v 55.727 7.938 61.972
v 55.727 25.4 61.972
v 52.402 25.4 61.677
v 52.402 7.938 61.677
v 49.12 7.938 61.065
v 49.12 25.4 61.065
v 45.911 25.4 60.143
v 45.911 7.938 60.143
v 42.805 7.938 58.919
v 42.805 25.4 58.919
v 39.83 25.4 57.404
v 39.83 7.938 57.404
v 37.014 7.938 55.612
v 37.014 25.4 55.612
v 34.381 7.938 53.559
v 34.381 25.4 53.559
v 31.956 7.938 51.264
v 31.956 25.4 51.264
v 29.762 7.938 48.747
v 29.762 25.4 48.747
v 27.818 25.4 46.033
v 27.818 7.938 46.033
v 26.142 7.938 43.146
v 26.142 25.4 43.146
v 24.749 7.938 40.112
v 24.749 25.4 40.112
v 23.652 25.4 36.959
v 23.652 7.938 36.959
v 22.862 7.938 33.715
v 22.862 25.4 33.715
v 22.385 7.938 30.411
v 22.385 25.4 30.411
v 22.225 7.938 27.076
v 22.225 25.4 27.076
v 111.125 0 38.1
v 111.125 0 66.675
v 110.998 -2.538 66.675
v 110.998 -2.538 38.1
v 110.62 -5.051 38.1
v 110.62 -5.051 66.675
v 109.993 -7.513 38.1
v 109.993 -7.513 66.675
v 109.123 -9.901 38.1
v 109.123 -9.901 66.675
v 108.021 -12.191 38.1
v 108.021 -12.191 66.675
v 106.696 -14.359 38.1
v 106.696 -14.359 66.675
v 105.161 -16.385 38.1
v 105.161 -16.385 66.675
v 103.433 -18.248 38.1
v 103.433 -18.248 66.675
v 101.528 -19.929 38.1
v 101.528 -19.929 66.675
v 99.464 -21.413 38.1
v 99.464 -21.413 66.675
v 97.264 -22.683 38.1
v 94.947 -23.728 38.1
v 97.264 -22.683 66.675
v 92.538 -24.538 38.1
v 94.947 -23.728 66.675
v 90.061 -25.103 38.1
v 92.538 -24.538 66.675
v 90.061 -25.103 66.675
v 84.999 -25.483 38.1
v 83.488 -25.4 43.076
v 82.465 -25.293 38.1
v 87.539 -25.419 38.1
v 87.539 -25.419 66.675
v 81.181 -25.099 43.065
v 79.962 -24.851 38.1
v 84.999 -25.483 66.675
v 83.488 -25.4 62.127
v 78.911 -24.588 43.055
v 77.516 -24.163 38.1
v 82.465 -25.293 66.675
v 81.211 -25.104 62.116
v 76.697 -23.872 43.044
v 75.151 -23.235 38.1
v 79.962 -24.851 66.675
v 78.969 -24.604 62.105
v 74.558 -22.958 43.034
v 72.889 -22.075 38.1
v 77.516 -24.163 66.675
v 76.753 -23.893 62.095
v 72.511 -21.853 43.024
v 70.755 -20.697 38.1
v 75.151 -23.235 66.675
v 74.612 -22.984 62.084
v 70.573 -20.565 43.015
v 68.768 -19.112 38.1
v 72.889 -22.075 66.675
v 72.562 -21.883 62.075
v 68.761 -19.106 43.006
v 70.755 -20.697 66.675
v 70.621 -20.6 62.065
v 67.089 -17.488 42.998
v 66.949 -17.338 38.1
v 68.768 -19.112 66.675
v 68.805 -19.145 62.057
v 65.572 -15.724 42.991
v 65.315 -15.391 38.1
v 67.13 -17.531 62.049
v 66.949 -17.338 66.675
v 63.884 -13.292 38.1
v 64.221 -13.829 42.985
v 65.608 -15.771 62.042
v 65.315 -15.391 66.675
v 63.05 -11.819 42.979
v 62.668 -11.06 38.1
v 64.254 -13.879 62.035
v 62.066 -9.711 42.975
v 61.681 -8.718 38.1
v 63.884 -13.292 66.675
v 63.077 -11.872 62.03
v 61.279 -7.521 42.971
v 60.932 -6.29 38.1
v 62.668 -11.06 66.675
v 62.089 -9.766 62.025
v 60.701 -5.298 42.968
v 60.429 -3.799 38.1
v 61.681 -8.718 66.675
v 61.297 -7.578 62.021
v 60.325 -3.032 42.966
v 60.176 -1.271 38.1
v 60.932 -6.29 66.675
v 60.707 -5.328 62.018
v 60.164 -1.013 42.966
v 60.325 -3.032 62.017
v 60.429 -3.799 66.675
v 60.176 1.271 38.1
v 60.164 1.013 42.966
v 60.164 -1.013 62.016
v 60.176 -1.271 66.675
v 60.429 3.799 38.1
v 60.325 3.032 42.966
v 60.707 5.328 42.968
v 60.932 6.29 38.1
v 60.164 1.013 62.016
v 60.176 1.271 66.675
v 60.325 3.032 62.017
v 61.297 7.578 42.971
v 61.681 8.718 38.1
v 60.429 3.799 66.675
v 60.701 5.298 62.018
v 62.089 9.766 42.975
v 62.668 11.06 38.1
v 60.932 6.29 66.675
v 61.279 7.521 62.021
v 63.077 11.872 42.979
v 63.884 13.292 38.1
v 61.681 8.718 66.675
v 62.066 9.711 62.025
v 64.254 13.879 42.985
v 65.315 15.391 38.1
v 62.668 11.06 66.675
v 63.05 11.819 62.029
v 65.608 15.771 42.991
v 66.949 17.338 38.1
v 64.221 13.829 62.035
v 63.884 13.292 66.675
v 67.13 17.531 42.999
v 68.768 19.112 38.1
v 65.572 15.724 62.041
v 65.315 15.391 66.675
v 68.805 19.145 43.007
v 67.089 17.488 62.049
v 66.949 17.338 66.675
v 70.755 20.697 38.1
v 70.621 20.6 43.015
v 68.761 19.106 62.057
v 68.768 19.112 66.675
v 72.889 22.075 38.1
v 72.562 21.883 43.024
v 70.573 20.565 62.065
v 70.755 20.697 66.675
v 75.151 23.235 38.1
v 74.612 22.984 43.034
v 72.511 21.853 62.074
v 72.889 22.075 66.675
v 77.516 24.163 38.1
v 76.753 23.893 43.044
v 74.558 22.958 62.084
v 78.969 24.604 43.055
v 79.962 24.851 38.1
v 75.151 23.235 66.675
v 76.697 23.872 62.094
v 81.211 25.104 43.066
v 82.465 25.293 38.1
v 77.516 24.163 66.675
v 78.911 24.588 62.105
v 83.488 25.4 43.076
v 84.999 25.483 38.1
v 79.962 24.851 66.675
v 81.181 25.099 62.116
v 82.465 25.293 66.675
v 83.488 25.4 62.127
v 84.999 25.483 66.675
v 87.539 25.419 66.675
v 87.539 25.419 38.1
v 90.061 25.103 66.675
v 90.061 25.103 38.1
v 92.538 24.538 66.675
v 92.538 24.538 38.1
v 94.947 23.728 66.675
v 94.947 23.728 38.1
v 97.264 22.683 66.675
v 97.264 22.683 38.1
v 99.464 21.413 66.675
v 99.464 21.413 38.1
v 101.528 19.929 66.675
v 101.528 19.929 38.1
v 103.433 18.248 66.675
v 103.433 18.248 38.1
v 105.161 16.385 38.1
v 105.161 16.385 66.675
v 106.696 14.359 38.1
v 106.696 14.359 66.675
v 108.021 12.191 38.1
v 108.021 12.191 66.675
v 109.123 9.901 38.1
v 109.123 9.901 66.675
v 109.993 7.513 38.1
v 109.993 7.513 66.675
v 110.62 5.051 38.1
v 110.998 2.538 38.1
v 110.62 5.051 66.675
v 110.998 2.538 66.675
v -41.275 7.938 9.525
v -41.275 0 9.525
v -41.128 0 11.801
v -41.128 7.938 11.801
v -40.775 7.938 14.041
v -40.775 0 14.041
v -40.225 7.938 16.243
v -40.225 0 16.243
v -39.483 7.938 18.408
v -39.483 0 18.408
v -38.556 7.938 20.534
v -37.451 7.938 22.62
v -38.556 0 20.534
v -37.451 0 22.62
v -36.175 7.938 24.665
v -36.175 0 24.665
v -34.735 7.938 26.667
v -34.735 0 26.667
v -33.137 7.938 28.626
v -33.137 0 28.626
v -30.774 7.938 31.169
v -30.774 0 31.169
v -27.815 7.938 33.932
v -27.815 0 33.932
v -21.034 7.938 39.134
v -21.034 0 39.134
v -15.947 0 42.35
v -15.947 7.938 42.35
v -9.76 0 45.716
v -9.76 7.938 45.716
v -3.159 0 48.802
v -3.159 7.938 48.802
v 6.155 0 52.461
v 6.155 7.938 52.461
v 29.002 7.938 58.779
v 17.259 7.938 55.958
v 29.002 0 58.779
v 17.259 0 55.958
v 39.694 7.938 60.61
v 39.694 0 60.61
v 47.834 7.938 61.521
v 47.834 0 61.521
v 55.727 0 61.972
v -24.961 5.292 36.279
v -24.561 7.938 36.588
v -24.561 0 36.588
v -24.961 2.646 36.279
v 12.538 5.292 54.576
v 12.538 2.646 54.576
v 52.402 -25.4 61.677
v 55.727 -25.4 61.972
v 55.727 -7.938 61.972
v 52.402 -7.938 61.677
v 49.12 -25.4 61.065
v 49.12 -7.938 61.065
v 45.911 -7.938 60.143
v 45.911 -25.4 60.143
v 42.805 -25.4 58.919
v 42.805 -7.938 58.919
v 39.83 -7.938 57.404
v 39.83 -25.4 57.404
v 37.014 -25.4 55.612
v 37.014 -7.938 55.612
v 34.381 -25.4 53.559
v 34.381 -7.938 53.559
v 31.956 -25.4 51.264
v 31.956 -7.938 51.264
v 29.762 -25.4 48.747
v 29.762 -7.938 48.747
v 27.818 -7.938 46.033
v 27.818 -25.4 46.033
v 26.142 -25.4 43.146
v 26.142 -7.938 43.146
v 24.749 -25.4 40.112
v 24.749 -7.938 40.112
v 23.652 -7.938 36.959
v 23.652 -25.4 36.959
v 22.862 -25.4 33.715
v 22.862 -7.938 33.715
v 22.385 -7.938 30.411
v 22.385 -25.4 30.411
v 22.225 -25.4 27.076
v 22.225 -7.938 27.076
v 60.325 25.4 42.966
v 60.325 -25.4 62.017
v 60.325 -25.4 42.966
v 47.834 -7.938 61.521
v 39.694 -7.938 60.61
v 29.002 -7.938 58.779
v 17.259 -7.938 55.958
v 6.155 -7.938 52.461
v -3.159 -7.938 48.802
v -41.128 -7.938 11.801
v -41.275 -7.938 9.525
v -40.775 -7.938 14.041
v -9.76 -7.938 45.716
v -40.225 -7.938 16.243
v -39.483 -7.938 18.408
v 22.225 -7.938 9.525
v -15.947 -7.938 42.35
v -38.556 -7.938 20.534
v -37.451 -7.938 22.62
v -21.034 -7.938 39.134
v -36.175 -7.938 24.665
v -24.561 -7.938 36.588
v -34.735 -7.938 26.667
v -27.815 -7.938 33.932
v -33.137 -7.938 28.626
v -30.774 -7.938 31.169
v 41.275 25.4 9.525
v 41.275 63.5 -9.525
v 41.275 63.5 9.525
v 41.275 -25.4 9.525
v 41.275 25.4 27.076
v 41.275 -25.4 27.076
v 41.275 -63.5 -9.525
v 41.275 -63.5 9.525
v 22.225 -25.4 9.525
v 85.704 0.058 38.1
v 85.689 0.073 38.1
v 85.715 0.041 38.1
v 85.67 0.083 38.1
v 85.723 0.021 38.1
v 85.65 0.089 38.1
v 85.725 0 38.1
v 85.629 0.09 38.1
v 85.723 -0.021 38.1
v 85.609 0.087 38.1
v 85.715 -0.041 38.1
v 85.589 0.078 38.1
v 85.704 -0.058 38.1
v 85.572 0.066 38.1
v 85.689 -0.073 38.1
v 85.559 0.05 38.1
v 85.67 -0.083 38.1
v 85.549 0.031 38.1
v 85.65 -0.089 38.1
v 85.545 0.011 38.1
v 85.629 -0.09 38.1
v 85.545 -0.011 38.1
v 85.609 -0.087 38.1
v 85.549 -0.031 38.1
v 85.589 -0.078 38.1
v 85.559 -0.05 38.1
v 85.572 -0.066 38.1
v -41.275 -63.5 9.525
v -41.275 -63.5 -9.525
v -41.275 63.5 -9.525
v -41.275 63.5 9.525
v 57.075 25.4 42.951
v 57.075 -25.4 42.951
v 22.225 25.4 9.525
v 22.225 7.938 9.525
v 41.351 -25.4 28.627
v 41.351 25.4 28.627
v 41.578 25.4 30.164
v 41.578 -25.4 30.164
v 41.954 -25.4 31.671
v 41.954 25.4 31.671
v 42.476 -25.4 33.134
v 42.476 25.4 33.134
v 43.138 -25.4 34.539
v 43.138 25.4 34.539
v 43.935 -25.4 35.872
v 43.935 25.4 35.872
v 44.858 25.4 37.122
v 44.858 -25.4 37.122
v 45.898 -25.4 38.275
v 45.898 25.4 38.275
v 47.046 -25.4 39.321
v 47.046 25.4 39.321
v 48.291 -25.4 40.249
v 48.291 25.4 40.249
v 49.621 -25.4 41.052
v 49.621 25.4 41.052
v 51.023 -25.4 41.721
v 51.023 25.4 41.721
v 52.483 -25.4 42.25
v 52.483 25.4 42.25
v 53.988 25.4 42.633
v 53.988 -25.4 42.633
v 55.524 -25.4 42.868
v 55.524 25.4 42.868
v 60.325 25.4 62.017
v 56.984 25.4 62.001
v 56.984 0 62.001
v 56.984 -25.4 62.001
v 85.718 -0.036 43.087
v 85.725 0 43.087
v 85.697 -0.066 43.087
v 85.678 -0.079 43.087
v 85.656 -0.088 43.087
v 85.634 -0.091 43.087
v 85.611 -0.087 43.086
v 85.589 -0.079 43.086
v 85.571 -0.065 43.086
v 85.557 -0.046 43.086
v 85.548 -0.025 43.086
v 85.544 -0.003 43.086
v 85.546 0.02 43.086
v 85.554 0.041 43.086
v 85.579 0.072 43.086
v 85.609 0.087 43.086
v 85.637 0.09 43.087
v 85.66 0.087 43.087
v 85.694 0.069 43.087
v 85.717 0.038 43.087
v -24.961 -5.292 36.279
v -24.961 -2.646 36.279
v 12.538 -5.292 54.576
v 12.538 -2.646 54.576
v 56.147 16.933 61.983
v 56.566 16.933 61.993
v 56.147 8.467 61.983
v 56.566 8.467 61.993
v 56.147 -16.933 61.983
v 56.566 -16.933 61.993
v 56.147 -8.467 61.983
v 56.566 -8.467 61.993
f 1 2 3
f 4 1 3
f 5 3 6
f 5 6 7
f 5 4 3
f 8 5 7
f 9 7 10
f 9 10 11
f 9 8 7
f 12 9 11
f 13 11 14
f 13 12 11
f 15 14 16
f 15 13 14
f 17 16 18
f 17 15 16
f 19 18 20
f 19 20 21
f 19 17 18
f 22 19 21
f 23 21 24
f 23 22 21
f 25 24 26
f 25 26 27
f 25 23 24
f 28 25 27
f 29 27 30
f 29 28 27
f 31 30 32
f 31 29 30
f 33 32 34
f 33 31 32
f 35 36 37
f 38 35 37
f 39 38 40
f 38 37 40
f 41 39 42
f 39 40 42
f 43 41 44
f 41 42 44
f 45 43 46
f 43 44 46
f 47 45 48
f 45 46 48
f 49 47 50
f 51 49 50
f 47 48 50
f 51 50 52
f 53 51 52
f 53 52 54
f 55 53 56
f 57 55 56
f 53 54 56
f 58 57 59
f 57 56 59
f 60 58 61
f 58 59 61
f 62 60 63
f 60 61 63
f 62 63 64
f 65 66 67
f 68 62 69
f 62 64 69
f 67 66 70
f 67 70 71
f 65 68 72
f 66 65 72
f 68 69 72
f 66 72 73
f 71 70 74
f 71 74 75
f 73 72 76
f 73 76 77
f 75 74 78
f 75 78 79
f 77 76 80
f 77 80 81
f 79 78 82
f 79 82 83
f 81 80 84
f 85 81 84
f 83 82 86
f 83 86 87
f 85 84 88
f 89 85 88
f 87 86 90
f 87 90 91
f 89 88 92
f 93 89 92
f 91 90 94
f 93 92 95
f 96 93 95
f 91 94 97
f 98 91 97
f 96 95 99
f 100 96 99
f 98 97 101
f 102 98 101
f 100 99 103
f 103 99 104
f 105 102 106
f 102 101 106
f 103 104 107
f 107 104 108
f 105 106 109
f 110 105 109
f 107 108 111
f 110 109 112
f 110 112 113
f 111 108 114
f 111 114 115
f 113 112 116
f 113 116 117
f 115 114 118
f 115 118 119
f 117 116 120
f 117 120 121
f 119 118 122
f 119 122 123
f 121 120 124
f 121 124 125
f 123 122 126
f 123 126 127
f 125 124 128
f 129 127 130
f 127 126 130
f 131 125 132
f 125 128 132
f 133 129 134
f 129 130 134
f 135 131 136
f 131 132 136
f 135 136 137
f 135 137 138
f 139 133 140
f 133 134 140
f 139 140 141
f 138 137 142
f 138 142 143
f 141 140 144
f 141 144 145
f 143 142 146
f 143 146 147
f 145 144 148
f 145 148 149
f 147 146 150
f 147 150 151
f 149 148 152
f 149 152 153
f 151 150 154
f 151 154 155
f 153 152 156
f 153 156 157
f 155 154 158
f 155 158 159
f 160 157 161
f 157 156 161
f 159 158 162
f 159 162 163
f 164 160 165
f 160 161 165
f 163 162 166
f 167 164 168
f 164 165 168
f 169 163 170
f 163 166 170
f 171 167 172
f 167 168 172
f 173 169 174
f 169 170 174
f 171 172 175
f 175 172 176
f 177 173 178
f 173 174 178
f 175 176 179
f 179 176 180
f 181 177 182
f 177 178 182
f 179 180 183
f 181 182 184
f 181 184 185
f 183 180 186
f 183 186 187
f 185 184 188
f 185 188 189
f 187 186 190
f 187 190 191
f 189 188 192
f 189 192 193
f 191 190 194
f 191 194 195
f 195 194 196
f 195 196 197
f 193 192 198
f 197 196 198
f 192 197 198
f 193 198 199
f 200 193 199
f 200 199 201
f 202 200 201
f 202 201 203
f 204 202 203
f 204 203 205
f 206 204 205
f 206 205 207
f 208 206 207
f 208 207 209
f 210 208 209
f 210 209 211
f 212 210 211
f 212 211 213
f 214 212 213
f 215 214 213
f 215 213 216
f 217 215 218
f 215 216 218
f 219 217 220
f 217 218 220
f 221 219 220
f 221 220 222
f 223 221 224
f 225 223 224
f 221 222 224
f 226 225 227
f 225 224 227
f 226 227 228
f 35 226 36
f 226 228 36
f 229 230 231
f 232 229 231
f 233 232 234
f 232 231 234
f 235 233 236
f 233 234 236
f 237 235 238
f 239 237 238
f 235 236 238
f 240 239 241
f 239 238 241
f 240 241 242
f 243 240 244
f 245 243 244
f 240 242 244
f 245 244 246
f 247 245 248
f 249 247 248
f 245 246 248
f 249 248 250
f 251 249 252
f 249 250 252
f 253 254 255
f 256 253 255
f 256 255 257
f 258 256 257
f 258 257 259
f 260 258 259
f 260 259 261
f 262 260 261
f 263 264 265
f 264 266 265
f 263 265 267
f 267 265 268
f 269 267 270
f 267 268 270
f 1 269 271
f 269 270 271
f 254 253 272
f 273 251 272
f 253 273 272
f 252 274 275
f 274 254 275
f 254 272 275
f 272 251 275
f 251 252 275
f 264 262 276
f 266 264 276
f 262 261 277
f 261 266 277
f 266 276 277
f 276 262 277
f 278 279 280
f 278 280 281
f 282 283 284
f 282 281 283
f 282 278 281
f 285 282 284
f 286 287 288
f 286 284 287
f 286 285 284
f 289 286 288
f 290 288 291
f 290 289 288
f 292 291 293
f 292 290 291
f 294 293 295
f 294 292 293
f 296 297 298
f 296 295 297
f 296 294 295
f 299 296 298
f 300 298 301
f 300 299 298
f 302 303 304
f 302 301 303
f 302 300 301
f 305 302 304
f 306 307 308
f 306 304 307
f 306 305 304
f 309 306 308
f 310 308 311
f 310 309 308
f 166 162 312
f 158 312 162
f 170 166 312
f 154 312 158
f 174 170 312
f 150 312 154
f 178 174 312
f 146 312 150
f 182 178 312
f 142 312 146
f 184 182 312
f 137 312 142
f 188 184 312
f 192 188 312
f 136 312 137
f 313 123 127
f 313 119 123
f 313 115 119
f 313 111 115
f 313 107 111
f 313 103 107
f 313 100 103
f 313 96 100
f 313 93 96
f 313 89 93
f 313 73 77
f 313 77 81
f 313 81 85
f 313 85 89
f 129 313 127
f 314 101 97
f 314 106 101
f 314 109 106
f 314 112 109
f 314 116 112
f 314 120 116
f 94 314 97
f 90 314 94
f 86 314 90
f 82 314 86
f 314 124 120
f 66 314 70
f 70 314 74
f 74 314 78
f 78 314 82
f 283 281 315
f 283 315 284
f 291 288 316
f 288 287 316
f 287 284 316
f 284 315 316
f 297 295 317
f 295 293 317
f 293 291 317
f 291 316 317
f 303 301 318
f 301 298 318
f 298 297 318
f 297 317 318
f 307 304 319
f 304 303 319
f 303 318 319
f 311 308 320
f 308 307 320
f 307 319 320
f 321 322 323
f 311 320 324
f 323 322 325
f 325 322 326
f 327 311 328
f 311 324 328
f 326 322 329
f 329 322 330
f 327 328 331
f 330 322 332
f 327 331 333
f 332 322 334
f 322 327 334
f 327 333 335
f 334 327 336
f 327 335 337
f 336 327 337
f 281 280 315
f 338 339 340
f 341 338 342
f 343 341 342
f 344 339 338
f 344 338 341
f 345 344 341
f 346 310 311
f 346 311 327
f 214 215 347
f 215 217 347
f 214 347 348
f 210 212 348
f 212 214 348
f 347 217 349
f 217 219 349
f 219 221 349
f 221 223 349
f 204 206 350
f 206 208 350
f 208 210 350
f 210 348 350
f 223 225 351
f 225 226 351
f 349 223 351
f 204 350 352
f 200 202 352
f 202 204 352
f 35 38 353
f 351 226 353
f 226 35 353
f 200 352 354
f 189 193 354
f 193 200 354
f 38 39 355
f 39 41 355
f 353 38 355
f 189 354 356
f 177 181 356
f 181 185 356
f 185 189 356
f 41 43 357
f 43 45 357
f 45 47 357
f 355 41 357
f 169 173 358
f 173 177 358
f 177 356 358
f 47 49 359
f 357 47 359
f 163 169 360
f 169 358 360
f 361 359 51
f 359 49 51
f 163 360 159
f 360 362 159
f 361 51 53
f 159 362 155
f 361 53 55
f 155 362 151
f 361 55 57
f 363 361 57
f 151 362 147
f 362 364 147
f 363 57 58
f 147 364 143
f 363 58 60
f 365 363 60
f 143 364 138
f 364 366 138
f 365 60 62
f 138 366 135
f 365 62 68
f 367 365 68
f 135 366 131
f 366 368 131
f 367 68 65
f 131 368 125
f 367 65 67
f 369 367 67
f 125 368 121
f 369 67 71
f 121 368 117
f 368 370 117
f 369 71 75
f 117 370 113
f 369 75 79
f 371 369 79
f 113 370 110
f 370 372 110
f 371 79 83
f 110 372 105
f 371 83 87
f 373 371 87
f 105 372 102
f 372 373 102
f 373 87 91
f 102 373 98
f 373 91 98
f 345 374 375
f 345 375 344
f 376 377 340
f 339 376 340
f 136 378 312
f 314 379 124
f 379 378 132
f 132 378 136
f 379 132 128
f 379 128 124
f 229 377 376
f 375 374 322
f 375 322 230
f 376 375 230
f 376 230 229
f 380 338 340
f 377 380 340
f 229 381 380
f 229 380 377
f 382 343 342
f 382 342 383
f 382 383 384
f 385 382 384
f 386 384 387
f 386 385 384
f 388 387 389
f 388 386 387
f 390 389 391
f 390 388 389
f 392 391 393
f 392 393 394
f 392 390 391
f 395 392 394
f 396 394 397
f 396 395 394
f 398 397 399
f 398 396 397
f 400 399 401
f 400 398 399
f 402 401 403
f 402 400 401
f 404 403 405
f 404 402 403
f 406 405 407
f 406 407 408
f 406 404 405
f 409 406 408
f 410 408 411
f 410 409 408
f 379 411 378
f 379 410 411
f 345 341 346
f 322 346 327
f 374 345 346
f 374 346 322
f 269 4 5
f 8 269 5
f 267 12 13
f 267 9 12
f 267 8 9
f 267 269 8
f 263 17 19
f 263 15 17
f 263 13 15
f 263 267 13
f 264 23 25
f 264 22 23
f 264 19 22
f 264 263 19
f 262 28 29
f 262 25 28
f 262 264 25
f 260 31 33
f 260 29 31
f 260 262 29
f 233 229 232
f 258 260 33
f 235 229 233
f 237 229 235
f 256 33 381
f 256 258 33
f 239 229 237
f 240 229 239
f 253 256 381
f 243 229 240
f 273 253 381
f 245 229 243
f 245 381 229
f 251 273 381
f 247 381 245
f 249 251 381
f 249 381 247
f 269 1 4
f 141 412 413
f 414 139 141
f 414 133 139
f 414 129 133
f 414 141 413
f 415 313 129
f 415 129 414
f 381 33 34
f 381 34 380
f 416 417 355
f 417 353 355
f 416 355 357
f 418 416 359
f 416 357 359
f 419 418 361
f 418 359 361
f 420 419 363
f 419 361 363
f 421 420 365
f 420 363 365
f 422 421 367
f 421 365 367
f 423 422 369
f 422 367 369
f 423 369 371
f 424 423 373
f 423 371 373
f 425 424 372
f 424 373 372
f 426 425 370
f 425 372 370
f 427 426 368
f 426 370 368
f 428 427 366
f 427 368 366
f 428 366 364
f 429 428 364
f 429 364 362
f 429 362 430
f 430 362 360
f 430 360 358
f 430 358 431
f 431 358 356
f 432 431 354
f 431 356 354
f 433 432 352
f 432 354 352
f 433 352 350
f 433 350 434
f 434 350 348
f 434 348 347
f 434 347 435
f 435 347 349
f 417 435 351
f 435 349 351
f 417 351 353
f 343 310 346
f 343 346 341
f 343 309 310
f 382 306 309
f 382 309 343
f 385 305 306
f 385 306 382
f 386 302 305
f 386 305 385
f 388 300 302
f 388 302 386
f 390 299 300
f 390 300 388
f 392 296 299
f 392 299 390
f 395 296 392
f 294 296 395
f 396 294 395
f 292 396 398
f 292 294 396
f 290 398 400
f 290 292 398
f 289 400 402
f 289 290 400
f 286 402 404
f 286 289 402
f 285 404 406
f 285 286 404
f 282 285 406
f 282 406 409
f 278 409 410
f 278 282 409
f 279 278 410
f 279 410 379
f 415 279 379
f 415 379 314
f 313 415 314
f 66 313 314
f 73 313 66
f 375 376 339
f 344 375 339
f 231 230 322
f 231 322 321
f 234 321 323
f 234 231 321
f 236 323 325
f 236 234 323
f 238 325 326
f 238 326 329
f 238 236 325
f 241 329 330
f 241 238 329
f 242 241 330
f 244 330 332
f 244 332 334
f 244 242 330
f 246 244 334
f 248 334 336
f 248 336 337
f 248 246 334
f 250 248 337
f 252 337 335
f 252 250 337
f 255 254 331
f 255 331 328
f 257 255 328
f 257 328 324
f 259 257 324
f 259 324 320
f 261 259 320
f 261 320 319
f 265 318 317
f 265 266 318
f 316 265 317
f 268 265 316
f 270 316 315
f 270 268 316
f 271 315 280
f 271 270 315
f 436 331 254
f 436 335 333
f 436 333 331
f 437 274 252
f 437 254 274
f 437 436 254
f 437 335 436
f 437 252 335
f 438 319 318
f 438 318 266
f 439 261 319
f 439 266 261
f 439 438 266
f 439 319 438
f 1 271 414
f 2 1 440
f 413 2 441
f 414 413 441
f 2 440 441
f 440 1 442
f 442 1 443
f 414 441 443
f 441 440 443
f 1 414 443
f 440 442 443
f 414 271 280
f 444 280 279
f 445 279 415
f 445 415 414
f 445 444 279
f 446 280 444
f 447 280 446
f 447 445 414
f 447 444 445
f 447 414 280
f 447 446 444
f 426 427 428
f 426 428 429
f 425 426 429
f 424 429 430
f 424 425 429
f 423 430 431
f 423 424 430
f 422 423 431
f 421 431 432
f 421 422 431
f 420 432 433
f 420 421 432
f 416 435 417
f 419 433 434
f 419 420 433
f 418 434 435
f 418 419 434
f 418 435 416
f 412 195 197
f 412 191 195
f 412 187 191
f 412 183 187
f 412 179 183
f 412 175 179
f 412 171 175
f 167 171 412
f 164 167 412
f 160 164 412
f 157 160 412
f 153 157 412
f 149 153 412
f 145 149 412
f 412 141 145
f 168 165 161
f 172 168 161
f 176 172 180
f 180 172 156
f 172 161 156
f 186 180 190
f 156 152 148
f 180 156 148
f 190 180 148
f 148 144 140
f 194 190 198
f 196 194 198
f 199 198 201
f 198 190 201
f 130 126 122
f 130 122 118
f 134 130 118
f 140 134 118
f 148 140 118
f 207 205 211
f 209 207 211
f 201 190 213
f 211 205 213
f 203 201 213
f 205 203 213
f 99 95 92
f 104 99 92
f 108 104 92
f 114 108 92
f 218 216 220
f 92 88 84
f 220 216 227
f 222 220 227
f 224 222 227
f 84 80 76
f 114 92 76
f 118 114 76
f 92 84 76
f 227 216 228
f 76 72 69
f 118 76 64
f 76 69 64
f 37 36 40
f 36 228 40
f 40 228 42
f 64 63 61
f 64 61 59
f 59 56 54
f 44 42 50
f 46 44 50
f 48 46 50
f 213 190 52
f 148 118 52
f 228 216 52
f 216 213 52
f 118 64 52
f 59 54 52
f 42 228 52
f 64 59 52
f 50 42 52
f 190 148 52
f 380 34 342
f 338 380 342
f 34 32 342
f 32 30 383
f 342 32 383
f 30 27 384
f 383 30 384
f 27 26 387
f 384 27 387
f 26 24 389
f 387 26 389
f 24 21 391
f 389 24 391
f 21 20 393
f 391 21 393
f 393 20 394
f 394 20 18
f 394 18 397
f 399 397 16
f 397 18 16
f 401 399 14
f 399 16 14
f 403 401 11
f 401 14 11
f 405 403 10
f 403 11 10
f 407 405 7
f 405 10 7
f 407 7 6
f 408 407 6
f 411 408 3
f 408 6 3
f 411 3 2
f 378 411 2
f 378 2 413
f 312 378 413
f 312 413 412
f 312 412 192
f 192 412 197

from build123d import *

# Parameters (mm, degrees)
F1_DEPTH = 63.5
F2_DEPTH = 25.4
F3_DEPTH = 7.9375


with BuildPart() as f1:
    # F0 (on Front) → F1 (new body, symmetric)
    with BuildSketch(Plane.XZ):
        Polygon((-41.275, 9.525), (-41.275, -9.525), (41.275, -9.525), (41.275, 9.525), (22.225, 9.525), align=None)
    extrude(amount=F1_DEPTH, both=True)

    # F0 (on Front) → F2 (join, symmetric)
    with BuildSketch(Plane.XZ):
        with BuildLine():
            Line((22.225, 9.525), (41.275, 9.525))
            Line((41.275, 9.525), (41.275, 27.076038))
            ThreePointArc((41.275, 27.076038), (45.898045, 38.27466), (57.074575, 42.950859))
            Line((57.074575, 42.950859), (60.325, 42.966303))
            Line((60.325, 42.966303), (60.325, 62.016518))
            Line((60.325, 62.016518), (56.984065, 62.000644))
            add(Edge.make_bspline(
                [(55.727367, 61.972052), (56.147847, 61.983704), (56.566772, 61.993239), (56.984065, 62.000644)],
                knots=[110.259277, 110.259277, 110.259277, 110.259277, 111.393613, 111.393613, 111.393613, 111.393613], degree=3))
            ThreePointArc((55.727367, 61.972052), (31.956339, 51.263537), (22.225, 27.076038))
            Line((22.225, 27.076038), (22.225, 9.525))
        make_face()
        Polygon((85.63449, 62.136769), (60.325, 62.016518), (60.325, 42.966303), (85.725, 43.086984), (85.725, 52.3875), align=None)
    extrude(amount=F2_DEPTH, both=True)

    # F0 (on Front) → F3 (join, symmetric)
    with BuildSketch(Plane.XZ):
        with BuildLine():
            add(Edge.make_bspline(
                [(-41.275, 9.525), (-40.71646, 39.69462), (14.855971, 60.839367), (55.727367, 61.972052)],
                knots=[0, 0, 0, 0, 110.259277, 110.259277, 110.259277, 110.259277], degree=3))
            Line((-41.275, 9.525), (22.225, 9.525))
            Line((22.225, 9.525), (22.225, 27.076038))
            ThreePointArc((22.225, 27.076038), (31.956339, 51.263537), (55.727367, 61.972052))
        make_face()
    extrude(amount=F3_DEPTH, both=True)

    # F0 (on Front) → F4 (revolve)
    with BuildSketch(Plane.XZ):
        Polygon((85.63449, 66.675), (85.63449, 62.136769), (85.725, 52.3875), (85.725, 43.086984), (85.725, 38.1), (111.125, 38.1), (111.125, 66.675), align=None)
    revolve(axis=Axis((85.63449, 0, 64.405885), (0, 0, -1)))


solid = f1.part
